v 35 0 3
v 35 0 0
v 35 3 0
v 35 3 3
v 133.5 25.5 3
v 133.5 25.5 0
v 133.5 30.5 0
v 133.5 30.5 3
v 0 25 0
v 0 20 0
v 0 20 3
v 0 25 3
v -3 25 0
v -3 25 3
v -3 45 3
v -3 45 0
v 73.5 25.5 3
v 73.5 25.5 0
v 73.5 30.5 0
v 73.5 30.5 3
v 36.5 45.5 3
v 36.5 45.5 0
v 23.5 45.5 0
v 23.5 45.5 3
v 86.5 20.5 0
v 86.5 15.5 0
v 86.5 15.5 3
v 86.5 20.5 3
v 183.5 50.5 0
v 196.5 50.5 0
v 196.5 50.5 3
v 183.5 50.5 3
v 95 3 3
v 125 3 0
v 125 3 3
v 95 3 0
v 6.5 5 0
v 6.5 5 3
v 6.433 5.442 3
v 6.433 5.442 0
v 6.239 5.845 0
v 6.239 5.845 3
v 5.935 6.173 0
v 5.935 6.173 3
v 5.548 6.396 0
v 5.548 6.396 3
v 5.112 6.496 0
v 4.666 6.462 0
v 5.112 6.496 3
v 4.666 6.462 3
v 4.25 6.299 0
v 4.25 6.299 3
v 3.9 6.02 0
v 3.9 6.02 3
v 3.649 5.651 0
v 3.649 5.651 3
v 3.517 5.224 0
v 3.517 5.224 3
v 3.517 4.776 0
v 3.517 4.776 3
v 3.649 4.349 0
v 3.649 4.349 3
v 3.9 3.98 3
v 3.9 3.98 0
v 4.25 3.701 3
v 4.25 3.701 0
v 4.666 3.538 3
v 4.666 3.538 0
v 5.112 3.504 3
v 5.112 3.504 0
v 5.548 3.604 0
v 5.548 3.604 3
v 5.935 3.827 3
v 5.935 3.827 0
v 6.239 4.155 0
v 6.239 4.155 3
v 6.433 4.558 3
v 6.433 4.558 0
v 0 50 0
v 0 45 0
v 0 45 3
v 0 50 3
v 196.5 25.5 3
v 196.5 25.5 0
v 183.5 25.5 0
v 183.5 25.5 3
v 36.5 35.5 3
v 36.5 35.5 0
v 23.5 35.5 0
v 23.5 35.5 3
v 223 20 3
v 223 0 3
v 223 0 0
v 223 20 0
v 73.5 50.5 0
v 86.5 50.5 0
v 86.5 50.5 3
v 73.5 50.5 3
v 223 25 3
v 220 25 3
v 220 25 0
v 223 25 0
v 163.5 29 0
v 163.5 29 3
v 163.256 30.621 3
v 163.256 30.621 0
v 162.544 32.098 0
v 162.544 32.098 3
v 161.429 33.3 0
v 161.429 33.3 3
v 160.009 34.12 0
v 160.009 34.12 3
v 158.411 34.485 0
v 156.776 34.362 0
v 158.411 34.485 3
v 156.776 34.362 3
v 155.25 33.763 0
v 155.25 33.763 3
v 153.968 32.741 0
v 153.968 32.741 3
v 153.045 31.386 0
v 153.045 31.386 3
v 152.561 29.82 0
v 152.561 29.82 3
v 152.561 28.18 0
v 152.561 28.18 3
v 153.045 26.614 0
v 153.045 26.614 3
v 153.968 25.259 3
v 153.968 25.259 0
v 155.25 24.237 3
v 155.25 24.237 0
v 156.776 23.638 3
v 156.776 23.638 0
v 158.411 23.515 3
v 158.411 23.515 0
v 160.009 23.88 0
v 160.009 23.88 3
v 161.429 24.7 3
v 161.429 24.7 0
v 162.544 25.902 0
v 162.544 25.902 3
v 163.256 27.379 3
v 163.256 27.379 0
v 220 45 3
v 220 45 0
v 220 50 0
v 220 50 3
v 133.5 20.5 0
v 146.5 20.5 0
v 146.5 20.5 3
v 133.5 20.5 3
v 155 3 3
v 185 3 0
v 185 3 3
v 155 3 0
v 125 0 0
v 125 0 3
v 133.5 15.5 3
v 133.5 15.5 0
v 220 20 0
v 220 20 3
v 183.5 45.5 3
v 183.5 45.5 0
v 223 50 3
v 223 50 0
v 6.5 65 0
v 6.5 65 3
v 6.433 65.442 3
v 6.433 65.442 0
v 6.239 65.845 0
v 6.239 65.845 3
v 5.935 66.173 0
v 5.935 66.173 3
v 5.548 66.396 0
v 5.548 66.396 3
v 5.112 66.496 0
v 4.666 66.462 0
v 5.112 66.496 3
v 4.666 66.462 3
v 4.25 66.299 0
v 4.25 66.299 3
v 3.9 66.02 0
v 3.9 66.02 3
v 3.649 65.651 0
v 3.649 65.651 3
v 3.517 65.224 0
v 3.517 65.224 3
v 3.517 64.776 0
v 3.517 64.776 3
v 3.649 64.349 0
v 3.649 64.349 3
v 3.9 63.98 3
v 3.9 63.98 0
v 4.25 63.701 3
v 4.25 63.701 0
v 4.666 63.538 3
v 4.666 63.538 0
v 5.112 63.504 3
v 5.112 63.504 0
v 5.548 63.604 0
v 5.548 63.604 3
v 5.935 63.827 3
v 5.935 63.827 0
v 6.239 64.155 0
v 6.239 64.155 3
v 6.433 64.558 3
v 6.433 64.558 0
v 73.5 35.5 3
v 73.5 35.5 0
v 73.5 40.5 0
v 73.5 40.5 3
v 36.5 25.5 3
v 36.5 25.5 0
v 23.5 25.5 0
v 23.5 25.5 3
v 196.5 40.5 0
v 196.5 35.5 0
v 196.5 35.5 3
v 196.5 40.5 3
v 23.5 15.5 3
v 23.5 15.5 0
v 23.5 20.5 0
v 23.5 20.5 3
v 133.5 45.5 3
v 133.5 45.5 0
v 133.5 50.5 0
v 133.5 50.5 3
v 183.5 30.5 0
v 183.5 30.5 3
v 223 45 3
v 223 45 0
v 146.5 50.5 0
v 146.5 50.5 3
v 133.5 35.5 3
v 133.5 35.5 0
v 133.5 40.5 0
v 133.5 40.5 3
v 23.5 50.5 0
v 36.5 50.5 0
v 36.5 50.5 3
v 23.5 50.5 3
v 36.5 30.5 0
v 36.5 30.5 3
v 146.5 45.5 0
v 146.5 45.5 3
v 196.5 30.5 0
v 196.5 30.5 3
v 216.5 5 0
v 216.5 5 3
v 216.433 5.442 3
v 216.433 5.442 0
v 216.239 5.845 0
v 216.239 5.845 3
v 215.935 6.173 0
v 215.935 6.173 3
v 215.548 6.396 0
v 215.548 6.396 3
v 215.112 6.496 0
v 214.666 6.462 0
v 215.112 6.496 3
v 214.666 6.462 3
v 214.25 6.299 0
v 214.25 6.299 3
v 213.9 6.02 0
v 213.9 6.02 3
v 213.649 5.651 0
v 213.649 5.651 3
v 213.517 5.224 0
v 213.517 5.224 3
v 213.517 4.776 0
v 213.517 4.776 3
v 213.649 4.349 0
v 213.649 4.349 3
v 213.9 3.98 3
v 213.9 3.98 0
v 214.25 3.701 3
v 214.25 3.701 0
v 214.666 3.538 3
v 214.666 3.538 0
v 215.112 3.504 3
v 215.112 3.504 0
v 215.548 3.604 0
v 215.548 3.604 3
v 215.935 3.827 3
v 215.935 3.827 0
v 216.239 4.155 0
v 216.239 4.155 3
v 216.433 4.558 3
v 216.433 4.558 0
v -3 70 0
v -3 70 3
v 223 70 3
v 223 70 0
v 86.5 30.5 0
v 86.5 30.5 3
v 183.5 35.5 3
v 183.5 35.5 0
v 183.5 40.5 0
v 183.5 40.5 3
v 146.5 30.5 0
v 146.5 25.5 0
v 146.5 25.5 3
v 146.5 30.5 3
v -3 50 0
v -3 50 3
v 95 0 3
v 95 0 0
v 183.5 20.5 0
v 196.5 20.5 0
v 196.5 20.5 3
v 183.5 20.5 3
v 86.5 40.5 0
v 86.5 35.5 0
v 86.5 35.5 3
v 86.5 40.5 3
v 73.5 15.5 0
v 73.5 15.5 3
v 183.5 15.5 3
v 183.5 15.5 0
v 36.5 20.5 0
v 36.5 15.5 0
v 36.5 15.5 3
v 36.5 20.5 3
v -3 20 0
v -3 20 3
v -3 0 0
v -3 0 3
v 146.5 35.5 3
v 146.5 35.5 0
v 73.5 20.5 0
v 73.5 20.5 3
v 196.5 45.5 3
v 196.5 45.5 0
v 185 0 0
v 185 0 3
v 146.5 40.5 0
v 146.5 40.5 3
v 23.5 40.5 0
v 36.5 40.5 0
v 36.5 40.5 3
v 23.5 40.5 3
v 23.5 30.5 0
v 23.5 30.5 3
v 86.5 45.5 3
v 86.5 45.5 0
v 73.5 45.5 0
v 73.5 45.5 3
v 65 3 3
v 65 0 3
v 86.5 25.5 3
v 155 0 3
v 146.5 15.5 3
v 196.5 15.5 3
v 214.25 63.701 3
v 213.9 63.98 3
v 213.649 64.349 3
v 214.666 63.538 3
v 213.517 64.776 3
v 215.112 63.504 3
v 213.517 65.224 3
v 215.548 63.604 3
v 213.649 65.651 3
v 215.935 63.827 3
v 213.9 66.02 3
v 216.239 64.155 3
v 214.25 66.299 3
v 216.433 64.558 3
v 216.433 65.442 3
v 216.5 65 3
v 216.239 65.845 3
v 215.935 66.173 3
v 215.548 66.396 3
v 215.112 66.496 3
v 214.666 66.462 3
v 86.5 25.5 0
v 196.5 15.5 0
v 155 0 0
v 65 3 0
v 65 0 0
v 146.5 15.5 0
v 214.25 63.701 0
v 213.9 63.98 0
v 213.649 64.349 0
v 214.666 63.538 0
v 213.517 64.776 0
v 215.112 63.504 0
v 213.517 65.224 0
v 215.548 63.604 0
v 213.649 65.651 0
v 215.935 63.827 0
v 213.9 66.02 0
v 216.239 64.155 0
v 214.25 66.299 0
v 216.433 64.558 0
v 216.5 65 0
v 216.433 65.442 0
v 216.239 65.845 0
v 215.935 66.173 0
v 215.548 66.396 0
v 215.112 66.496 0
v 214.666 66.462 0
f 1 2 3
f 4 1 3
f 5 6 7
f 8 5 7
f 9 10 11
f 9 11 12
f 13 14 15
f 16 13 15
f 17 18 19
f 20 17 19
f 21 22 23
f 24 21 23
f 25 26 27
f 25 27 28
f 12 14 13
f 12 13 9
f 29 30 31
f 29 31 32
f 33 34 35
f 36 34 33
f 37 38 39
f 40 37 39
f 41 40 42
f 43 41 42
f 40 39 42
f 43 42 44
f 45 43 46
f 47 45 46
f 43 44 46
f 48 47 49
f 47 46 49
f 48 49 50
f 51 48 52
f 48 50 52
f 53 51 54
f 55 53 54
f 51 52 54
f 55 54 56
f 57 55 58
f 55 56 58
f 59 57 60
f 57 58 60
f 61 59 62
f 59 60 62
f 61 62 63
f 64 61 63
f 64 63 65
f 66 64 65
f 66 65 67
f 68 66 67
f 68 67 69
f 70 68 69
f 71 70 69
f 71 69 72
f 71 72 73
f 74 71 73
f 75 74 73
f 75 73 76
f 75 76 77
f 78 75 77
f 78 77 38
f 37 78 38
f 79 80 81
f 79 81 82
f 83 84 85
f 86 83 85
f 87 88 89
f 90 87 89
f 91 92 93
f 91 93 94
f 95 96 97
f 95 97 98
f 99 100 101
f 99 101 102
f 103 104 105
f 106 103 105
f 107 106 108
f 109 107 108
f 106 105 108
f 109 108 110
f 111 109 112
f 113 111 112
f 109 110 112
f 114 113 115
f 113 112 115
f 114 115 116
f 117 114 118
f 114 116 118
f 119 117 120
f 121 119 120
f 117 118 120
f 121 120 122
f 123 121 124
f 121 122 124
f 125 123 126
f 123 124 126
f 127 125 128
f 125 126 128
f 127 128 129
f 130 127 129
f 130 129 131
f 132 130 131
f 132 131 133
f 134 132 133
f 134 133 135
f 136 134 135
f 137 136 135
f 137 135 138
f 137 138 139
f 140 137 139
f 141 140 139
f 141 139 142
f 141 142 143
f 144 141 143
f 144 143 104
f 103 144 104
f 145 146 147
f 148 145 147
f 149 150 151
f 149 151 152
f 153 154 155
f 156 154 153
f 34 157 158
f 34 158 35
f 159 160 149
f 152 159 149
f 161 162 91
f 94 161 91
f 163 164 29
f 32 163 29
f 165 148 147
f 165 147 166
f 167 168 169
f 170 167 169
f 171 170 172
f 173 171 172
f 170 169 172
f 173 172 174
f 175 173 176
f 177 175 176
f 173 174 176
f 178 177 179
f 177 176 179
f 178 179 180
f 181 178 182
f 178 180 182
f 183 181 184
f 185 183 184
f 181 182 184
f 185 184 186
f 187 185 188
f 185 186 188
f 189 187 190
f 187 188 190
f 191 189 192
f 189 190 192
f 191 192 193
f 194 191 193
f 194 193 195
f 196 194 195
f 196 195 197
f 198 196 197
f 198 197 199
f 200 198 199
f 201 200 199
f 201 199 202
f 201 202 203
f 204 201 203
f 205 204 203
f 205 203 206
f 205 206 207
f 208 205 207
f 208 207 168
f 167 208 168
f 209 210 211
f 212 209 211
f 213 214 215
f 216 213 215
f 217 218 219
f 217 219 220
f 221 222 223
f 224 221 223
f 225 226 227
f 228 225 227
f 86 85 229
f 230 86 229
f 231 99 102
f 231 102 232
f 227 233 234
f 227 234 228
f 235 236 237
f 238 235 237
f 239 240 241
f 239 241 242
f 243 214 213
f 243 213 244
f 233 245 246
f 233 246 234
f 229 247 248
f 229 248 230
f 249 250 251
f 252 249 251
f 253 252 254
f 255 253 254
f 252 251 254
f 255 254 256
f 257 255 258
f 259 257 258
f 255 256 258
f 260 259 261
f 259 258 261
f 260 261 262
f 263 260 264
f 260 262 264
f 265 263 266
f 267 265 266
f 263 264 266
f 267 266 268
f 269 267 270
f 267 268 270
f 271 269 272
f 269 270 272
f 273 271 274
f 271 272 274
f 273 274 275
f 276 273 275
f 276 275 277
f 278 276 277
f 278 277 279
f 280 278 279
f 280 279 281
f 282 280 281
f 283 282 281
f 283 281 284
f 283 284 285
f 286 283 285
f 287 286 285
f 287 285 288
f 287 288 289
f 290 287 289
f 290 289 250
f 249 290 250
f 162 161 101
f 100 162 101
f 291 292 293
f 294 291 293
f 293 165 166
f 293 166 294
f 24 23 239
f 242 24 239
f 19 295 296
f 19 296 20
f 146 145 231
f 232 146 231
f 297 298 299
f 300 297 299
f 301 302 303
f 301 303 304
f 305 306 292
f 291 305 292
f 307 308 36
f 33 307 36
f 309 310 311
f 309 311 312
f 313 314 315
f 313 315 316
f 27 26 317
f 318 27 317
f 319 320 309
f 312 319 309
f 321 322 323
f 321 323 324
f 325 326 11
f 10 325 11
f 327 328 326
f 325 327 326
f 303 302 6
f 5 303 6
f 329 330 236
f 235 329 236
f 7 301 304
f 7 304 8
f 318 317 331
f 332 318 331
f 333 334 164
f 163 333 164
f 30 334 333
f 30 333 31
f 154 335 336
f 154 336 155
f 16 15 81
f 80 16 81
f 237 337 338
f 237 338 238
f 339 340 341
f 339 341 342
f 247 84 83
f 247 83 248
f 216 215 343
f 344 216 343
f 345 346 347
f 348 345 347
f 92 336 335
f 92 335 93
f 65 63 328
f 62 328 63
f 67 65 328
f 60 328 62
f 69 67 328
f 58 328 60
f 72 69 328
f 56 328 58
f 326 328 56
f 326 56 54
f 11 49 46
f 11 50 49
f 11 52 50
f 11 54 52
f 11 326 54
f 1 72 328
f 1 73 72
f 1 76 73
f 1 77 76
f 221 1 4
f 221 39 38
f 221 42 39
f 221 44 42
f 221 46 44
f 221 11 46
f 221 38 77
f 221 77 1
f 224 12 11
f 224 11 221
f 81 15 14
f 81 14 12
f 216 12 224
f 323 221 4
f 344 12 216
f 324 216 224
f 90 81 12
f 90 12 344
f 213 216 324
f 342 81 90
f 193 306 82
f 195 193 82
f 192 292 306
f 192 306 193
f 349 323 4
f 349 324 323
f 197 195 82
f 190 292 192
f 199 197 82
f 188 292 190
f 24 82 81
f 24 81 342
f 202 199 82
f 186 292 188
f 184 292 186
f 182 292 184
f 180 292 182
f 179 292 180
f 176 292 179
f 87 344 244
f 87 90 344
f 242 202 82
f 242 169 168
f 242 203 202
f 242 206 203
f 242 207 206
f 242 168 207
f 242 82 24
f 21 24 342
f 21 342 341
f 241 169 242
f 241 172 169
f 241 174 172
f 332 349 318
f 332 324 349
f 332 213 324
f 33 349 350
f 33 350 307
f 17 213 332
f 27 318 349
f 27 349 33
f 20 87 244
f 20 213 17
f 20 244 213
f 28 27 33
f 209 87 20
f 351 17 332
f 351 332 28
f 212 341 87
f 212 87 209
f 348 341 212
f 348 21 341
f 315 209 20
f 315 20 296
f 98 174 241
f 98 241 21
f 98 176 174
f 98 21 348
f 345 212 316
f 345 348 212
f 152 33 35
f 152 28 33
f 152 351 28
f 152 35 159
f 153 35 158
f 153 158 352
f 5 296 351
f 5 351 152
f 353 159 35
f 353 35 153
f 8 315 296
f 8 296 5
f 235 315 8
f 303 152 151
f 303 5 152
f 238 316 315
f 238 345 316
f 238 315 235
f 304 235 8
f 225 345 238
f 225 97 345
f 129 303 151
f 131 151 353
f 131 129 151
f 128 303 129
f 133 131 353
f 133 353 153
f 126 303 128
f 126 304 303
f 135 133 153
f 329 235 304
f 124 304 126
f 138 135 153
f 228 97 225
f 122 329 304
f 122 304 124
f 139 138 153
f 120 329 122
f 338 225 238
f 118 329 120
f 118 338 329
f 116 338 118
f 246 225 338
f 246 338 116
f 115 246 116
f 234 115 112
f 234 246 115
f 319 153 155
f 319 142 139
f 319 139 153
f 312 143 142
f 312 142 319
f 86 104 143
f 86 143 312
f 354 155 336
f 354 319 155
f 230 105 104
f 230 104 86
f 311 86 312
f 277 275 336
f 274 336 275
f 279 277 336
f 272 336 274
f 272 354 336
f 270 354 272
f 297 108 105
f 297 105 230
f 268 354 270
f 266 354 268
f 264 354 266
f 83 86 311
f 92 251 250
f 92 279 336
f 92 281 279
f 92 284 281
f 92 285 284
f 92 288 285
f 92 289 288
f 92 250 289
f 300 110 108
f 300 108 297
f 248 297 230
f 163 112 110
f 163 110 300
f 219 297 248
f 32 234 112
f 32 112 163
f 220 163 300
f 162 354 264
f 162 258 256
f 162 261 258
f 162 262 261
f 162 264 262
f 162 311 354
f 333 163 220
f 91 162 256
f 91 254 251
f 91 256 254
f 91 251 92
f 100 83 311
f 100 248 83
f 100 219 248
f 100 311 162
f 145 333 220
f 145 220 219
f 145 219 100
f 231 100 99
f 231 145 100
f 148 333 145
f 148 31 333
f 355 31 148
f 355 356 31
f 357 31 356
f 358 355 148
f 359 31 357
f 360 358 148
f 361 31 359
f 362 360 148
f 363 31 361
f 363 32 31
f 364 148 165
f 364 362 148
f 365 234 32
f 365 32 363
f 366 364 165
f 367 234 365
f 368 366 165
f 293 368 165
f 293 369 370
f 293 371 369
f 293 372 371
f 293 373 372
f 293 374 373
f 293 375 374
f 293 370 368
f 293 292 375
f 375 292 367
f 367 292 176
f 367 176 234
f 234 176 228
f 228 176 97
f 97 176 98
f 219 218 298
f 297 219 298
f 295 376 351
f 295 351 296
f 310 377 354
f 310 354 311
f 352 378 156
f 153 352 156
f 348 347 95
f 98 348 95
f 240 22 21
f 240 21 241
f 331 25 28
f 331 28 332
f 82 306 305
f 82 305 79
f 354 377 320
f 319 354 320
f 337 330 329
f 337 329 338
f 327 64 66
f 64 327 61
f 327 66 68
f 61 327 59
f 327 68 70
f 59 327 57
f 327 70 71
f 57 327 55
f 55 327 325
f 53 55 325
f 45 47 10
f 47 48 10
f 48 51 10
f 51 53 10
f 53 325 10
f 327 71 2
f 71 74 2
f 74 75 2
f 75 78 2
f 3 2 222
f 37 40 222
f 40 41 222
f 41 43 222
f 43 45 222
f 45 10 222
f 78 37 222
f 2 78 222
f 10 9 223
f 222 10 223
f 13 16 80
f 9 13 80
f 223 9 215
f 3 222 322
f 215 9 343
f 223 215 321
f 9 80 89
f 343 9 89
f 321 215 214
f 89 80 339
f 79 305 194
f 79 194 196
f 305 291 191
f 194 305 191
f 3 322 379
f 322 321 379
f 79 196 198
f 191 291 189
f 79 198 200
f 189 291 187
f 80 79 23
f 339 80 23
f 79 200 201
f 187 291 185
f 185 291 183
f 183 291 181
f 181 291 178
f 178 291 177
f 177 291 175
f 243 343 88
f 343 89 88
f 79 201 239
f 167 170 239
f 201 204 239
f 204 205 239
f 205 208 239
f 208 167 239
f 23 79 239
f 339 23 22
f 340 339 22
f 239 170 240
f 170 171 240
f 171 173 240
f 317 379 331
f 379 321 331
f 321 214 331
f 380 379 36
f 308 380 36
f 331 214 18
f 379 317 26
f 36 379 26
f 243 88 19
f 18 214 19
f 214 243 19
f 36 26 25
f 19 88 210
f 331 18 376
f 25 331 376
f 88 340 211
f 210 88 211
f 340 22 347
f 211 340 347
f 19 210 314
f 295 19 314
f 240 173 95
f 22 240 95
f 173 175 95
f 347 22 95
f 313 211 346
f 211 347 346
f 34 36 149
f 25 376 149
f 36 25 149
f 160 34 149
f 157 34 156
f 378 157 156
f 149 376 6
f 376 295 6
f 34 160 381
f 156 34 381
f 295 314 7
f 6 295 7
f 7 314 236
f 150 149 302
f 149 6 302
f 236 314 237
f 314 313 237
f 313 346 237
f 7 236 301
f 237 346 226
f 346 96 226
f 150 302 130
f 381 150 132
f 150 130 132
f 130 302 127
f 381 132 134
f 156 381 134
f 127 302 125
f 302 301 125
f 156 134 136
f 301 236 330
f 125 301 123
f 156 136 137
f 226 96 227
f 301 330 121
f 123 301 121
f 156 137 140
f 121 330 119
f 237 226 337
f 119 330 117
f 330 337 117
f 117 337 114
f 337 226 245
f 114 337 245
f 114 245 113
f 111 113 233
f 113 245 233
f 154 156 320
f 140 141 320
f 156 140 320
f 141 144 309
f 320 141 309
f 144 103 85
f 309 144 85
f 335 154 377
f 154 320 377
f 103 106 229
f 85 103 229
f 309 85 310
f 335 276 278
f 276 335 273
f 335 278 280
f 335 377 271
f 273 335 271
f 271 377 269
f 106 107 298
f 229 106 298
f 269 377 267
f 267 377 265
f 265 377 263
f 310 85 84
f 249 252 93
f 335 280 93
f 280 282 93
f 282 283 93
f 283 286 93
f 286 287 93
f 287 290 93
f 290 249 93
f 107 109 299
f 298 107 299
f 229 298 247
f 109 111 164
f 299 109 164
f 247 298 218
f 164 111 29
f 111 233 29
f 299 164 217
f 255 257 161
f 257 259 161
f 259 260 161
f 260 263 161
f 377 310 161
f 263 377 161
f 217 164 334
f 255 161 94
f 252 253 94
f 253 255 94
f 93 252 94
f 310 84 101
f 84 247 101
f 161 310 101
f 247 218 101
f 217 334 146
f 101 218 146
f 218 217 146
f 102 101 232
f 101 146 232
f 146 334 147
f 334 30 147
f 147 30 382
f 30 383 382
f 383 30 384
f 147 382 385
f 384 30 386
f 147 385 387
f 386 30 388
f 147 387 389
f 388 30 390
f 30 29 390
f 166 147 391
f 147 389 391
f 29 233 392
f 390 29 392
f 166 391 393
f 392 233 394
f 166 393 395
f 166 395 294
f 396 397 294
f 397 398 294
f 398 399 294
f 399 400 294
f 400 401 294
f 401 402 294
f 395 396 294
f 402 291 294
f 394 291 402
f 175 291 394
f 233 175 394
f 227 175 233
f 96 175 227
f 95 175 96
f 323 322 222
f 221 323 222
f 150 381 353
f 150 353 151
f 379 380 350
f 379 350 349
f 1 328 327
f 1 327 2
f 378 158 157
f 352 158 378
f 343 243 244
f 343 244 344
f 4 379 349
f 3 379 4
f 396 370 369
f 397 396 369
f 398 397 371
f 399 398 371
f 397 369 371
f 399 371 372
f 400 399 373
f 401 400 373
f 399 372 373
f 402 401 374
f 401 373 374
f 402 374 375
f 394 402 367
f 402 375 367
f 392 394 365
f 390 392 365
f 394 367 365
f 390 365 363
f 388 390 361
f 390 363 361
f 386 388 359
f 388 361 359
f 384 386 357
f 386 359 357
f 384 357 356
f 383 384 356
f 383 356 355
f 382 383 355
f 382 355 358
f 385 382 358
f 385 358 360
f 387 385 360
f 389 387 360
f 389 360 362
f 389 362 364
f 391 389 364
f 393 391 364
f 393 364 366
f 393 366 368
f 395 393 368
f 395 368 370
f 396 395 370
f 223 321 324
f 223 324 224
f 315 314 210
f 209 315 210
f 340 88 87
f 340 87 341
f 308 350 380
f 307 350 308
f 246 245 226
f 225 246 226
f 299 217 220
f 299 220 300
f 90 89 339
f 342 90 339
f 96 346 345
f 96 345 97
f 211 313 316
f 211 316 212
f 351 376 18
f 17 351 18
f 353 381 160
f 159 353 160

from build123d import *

# Parameters (mm, degrees)
SKETCH1_W           = 220
SKETCH1_H           = 70
BOSS_EXTRUDE1_DEPTH = 3
SKETCH2_2_R         = 1.5
CUT_EXTRUDE2_DEPTH  = 231.887418453
SKETCH3_W           = 3
SKETCH3_H           = 20
BOSS_EXTRUDE4_DEPTH = 3
LPATTERN1_COUNT     = 2
LPATTERN1_PITCH     = 25
LPATTERN1_COL_COUNT = 2
LPATTERN1_COL_PITCH = 25
SKETCH4_W           = 30
SKETCH4_H           = 3
CUT_EXTRUDE3_DEPTH  = 234.747727262
SKETCH5_R           = 5.5
CUT_EXTRUDE4_DEPTH  = 234.747727262
SKETCH6_W           = 13
SKETCH6_H           = 5
CUT_EXTRUDE5_DEPTH  = 234.747727262


with BuildPart() as part:
    # Sketch1 → Boss-Extrude1 (new body)
    with BuildSketch(Plane.XY):
        with Locations((110, 35)):
            Rectangle(SKETCH1_W, SKETCH1_H)
    extrude(amount=BOSS_EXTRUDE1_DEPTH)

    # Sketch2<2> → Cut-Extrude2 (cut, through all)
    with BuildSketch(Plane.XY.offset(3)):
        with Locations((5, 65)):
            Circle(SKETCH2_2_R)
        with Locations((5, 5)):
            Circle(SKETCH2_2_R)
        with Locations((215, 5)):
            Circle(SKETCH2_2_R)
        with Locations((215, 65)):
            Circle(SKETCH2_2_R)
    extrude(amount=-CUT_EXTRUDE2_DEPTH, mode=Mode.SUBTRACT)

    # Sketch3 → Boss-Extrude4 (add)
    with BuildSketch(Plane.XY.offset(3)):
        with Locations((-1.5, 35)):
            Rectangle(SKETCH3_W, SKETCH3_H)
        with Locations((221.5, 35)):
            Rectangle(SKETCH3_W, SKETCH3_H)
    boss_extrude4 = extrude(amount=-BOSS_EXTRUDE4_DEPTH)

    # LPattern1: Boss-Extrude4 ×2
    with Locations(*[(0, i * LPATTERN1_PITCH, 0) for i in range(1, LPATTERN1_COUNT)]):
        add(boss_extrude4)

    # LPattern1 col: Boss-Extrude4 ×2
    with Locations(*[(0, -i * LPATTERN1_COL_PITCH, 0) for i in range(1, LPATTERN1_COL_COUNT)]):
        add(boss_extrude4)

    # Sketch4 → Cut-Extrude3 (cut, through all)
    with BuildSketch(Plane(origin=(0, 0, 0), x_dir=(-1, 0, 0), z_dir=(0, 0, -1))):
        with Locations((-170, 1.5)):
            Rectangle(SKETCH4_W, SKETCH4_H)
        with Locations((-110, 1.5)):
            Rectangle(SKETCH4_W, SKETCH4_H)
        with Locations((-50, 1.5)):
            Rectangle(SKETCH4_W, SKETCH4_H)
    extrude(amount=-CUT_EXTRUDE3_DEPTH, mode=Mode.SUBTRACT)

    # Sketch5 → Cut-Extrude4 (cut, through all)
    with BuildSketch(Plane.XY.offset(3)):
        with Locations((158, 29)):
            Circle(SKETCH5_R)
    extrude(amount=-CUT_EXTRUDE4_DEPTH, mode=Mode.SUBTRACT)

    # Sketch6 → Cut-Extrude5 (cut, through all)
    with BuildSketch(Plane(origin=(0, 0, 0), x_dir=(-1, 0, 0), z_dir=(0, 0, -1))):
        with Locations((-140, 48)):
            Rectangle(SKETCH6_W, SKETCH6_H)
        with Locations((-190, 48)):
            Rectangle(SKETCH6_W, SKETCH6_H)
        with Locations((-190, 38)):
            Rectangle(SKETCH6_W, SKETCH6_H)
        with Locations((-190, 28)):
            Rectangle(SKETCH6_W, SKETCH6_H)
        with Locations((-190, 18)):
            Rectangle(SKETCH6_W, SKETCH6_H)
        with Locations((-140, 38)):
            Rectangle(SKETCH6_W, SKETCH6_H)
        with Locations((-140, 28)):
            Rectangle(SKETCH6_W, SKETCH6_H)
        with Locations((-140, 18)):
            Rectangle(SKETCH6_W, SKETCH6_H)
        with Locations((-80, 18)):
            Rectangle(SKETCH6_W, SKETCH6_H)
        with Locations((-80, 28)):
            Rectangle(SKETCH6_W, SKETCH6_H)
        with Locations((-80, 38)):
            Rectangle(SKETCH6_W, SKETCH6_H)
        with Locations((-30, 18)):
            Rectangle(SKETCH6_W, SKETCH6_H)
        with Locations((-30, 28)):
            Rectangle(SKETCH6_W, SKETCH6_H)
        with Locations((-30, 38)):
            Rectangle(SKETCH6_W, SKETCH6_H)
        with Locations((-30, 48)):
            Rectangle(SKETCH6_W, SKETCH6_H)
        with Locations((-80, 48)):
            Rectangle(SKETCH6_W, SKETCH6_H)
    extrude(amount=-CUT_EXTRUDE5_DEPTH, mode=Mode.SUBTRACT)


solid = part.part
